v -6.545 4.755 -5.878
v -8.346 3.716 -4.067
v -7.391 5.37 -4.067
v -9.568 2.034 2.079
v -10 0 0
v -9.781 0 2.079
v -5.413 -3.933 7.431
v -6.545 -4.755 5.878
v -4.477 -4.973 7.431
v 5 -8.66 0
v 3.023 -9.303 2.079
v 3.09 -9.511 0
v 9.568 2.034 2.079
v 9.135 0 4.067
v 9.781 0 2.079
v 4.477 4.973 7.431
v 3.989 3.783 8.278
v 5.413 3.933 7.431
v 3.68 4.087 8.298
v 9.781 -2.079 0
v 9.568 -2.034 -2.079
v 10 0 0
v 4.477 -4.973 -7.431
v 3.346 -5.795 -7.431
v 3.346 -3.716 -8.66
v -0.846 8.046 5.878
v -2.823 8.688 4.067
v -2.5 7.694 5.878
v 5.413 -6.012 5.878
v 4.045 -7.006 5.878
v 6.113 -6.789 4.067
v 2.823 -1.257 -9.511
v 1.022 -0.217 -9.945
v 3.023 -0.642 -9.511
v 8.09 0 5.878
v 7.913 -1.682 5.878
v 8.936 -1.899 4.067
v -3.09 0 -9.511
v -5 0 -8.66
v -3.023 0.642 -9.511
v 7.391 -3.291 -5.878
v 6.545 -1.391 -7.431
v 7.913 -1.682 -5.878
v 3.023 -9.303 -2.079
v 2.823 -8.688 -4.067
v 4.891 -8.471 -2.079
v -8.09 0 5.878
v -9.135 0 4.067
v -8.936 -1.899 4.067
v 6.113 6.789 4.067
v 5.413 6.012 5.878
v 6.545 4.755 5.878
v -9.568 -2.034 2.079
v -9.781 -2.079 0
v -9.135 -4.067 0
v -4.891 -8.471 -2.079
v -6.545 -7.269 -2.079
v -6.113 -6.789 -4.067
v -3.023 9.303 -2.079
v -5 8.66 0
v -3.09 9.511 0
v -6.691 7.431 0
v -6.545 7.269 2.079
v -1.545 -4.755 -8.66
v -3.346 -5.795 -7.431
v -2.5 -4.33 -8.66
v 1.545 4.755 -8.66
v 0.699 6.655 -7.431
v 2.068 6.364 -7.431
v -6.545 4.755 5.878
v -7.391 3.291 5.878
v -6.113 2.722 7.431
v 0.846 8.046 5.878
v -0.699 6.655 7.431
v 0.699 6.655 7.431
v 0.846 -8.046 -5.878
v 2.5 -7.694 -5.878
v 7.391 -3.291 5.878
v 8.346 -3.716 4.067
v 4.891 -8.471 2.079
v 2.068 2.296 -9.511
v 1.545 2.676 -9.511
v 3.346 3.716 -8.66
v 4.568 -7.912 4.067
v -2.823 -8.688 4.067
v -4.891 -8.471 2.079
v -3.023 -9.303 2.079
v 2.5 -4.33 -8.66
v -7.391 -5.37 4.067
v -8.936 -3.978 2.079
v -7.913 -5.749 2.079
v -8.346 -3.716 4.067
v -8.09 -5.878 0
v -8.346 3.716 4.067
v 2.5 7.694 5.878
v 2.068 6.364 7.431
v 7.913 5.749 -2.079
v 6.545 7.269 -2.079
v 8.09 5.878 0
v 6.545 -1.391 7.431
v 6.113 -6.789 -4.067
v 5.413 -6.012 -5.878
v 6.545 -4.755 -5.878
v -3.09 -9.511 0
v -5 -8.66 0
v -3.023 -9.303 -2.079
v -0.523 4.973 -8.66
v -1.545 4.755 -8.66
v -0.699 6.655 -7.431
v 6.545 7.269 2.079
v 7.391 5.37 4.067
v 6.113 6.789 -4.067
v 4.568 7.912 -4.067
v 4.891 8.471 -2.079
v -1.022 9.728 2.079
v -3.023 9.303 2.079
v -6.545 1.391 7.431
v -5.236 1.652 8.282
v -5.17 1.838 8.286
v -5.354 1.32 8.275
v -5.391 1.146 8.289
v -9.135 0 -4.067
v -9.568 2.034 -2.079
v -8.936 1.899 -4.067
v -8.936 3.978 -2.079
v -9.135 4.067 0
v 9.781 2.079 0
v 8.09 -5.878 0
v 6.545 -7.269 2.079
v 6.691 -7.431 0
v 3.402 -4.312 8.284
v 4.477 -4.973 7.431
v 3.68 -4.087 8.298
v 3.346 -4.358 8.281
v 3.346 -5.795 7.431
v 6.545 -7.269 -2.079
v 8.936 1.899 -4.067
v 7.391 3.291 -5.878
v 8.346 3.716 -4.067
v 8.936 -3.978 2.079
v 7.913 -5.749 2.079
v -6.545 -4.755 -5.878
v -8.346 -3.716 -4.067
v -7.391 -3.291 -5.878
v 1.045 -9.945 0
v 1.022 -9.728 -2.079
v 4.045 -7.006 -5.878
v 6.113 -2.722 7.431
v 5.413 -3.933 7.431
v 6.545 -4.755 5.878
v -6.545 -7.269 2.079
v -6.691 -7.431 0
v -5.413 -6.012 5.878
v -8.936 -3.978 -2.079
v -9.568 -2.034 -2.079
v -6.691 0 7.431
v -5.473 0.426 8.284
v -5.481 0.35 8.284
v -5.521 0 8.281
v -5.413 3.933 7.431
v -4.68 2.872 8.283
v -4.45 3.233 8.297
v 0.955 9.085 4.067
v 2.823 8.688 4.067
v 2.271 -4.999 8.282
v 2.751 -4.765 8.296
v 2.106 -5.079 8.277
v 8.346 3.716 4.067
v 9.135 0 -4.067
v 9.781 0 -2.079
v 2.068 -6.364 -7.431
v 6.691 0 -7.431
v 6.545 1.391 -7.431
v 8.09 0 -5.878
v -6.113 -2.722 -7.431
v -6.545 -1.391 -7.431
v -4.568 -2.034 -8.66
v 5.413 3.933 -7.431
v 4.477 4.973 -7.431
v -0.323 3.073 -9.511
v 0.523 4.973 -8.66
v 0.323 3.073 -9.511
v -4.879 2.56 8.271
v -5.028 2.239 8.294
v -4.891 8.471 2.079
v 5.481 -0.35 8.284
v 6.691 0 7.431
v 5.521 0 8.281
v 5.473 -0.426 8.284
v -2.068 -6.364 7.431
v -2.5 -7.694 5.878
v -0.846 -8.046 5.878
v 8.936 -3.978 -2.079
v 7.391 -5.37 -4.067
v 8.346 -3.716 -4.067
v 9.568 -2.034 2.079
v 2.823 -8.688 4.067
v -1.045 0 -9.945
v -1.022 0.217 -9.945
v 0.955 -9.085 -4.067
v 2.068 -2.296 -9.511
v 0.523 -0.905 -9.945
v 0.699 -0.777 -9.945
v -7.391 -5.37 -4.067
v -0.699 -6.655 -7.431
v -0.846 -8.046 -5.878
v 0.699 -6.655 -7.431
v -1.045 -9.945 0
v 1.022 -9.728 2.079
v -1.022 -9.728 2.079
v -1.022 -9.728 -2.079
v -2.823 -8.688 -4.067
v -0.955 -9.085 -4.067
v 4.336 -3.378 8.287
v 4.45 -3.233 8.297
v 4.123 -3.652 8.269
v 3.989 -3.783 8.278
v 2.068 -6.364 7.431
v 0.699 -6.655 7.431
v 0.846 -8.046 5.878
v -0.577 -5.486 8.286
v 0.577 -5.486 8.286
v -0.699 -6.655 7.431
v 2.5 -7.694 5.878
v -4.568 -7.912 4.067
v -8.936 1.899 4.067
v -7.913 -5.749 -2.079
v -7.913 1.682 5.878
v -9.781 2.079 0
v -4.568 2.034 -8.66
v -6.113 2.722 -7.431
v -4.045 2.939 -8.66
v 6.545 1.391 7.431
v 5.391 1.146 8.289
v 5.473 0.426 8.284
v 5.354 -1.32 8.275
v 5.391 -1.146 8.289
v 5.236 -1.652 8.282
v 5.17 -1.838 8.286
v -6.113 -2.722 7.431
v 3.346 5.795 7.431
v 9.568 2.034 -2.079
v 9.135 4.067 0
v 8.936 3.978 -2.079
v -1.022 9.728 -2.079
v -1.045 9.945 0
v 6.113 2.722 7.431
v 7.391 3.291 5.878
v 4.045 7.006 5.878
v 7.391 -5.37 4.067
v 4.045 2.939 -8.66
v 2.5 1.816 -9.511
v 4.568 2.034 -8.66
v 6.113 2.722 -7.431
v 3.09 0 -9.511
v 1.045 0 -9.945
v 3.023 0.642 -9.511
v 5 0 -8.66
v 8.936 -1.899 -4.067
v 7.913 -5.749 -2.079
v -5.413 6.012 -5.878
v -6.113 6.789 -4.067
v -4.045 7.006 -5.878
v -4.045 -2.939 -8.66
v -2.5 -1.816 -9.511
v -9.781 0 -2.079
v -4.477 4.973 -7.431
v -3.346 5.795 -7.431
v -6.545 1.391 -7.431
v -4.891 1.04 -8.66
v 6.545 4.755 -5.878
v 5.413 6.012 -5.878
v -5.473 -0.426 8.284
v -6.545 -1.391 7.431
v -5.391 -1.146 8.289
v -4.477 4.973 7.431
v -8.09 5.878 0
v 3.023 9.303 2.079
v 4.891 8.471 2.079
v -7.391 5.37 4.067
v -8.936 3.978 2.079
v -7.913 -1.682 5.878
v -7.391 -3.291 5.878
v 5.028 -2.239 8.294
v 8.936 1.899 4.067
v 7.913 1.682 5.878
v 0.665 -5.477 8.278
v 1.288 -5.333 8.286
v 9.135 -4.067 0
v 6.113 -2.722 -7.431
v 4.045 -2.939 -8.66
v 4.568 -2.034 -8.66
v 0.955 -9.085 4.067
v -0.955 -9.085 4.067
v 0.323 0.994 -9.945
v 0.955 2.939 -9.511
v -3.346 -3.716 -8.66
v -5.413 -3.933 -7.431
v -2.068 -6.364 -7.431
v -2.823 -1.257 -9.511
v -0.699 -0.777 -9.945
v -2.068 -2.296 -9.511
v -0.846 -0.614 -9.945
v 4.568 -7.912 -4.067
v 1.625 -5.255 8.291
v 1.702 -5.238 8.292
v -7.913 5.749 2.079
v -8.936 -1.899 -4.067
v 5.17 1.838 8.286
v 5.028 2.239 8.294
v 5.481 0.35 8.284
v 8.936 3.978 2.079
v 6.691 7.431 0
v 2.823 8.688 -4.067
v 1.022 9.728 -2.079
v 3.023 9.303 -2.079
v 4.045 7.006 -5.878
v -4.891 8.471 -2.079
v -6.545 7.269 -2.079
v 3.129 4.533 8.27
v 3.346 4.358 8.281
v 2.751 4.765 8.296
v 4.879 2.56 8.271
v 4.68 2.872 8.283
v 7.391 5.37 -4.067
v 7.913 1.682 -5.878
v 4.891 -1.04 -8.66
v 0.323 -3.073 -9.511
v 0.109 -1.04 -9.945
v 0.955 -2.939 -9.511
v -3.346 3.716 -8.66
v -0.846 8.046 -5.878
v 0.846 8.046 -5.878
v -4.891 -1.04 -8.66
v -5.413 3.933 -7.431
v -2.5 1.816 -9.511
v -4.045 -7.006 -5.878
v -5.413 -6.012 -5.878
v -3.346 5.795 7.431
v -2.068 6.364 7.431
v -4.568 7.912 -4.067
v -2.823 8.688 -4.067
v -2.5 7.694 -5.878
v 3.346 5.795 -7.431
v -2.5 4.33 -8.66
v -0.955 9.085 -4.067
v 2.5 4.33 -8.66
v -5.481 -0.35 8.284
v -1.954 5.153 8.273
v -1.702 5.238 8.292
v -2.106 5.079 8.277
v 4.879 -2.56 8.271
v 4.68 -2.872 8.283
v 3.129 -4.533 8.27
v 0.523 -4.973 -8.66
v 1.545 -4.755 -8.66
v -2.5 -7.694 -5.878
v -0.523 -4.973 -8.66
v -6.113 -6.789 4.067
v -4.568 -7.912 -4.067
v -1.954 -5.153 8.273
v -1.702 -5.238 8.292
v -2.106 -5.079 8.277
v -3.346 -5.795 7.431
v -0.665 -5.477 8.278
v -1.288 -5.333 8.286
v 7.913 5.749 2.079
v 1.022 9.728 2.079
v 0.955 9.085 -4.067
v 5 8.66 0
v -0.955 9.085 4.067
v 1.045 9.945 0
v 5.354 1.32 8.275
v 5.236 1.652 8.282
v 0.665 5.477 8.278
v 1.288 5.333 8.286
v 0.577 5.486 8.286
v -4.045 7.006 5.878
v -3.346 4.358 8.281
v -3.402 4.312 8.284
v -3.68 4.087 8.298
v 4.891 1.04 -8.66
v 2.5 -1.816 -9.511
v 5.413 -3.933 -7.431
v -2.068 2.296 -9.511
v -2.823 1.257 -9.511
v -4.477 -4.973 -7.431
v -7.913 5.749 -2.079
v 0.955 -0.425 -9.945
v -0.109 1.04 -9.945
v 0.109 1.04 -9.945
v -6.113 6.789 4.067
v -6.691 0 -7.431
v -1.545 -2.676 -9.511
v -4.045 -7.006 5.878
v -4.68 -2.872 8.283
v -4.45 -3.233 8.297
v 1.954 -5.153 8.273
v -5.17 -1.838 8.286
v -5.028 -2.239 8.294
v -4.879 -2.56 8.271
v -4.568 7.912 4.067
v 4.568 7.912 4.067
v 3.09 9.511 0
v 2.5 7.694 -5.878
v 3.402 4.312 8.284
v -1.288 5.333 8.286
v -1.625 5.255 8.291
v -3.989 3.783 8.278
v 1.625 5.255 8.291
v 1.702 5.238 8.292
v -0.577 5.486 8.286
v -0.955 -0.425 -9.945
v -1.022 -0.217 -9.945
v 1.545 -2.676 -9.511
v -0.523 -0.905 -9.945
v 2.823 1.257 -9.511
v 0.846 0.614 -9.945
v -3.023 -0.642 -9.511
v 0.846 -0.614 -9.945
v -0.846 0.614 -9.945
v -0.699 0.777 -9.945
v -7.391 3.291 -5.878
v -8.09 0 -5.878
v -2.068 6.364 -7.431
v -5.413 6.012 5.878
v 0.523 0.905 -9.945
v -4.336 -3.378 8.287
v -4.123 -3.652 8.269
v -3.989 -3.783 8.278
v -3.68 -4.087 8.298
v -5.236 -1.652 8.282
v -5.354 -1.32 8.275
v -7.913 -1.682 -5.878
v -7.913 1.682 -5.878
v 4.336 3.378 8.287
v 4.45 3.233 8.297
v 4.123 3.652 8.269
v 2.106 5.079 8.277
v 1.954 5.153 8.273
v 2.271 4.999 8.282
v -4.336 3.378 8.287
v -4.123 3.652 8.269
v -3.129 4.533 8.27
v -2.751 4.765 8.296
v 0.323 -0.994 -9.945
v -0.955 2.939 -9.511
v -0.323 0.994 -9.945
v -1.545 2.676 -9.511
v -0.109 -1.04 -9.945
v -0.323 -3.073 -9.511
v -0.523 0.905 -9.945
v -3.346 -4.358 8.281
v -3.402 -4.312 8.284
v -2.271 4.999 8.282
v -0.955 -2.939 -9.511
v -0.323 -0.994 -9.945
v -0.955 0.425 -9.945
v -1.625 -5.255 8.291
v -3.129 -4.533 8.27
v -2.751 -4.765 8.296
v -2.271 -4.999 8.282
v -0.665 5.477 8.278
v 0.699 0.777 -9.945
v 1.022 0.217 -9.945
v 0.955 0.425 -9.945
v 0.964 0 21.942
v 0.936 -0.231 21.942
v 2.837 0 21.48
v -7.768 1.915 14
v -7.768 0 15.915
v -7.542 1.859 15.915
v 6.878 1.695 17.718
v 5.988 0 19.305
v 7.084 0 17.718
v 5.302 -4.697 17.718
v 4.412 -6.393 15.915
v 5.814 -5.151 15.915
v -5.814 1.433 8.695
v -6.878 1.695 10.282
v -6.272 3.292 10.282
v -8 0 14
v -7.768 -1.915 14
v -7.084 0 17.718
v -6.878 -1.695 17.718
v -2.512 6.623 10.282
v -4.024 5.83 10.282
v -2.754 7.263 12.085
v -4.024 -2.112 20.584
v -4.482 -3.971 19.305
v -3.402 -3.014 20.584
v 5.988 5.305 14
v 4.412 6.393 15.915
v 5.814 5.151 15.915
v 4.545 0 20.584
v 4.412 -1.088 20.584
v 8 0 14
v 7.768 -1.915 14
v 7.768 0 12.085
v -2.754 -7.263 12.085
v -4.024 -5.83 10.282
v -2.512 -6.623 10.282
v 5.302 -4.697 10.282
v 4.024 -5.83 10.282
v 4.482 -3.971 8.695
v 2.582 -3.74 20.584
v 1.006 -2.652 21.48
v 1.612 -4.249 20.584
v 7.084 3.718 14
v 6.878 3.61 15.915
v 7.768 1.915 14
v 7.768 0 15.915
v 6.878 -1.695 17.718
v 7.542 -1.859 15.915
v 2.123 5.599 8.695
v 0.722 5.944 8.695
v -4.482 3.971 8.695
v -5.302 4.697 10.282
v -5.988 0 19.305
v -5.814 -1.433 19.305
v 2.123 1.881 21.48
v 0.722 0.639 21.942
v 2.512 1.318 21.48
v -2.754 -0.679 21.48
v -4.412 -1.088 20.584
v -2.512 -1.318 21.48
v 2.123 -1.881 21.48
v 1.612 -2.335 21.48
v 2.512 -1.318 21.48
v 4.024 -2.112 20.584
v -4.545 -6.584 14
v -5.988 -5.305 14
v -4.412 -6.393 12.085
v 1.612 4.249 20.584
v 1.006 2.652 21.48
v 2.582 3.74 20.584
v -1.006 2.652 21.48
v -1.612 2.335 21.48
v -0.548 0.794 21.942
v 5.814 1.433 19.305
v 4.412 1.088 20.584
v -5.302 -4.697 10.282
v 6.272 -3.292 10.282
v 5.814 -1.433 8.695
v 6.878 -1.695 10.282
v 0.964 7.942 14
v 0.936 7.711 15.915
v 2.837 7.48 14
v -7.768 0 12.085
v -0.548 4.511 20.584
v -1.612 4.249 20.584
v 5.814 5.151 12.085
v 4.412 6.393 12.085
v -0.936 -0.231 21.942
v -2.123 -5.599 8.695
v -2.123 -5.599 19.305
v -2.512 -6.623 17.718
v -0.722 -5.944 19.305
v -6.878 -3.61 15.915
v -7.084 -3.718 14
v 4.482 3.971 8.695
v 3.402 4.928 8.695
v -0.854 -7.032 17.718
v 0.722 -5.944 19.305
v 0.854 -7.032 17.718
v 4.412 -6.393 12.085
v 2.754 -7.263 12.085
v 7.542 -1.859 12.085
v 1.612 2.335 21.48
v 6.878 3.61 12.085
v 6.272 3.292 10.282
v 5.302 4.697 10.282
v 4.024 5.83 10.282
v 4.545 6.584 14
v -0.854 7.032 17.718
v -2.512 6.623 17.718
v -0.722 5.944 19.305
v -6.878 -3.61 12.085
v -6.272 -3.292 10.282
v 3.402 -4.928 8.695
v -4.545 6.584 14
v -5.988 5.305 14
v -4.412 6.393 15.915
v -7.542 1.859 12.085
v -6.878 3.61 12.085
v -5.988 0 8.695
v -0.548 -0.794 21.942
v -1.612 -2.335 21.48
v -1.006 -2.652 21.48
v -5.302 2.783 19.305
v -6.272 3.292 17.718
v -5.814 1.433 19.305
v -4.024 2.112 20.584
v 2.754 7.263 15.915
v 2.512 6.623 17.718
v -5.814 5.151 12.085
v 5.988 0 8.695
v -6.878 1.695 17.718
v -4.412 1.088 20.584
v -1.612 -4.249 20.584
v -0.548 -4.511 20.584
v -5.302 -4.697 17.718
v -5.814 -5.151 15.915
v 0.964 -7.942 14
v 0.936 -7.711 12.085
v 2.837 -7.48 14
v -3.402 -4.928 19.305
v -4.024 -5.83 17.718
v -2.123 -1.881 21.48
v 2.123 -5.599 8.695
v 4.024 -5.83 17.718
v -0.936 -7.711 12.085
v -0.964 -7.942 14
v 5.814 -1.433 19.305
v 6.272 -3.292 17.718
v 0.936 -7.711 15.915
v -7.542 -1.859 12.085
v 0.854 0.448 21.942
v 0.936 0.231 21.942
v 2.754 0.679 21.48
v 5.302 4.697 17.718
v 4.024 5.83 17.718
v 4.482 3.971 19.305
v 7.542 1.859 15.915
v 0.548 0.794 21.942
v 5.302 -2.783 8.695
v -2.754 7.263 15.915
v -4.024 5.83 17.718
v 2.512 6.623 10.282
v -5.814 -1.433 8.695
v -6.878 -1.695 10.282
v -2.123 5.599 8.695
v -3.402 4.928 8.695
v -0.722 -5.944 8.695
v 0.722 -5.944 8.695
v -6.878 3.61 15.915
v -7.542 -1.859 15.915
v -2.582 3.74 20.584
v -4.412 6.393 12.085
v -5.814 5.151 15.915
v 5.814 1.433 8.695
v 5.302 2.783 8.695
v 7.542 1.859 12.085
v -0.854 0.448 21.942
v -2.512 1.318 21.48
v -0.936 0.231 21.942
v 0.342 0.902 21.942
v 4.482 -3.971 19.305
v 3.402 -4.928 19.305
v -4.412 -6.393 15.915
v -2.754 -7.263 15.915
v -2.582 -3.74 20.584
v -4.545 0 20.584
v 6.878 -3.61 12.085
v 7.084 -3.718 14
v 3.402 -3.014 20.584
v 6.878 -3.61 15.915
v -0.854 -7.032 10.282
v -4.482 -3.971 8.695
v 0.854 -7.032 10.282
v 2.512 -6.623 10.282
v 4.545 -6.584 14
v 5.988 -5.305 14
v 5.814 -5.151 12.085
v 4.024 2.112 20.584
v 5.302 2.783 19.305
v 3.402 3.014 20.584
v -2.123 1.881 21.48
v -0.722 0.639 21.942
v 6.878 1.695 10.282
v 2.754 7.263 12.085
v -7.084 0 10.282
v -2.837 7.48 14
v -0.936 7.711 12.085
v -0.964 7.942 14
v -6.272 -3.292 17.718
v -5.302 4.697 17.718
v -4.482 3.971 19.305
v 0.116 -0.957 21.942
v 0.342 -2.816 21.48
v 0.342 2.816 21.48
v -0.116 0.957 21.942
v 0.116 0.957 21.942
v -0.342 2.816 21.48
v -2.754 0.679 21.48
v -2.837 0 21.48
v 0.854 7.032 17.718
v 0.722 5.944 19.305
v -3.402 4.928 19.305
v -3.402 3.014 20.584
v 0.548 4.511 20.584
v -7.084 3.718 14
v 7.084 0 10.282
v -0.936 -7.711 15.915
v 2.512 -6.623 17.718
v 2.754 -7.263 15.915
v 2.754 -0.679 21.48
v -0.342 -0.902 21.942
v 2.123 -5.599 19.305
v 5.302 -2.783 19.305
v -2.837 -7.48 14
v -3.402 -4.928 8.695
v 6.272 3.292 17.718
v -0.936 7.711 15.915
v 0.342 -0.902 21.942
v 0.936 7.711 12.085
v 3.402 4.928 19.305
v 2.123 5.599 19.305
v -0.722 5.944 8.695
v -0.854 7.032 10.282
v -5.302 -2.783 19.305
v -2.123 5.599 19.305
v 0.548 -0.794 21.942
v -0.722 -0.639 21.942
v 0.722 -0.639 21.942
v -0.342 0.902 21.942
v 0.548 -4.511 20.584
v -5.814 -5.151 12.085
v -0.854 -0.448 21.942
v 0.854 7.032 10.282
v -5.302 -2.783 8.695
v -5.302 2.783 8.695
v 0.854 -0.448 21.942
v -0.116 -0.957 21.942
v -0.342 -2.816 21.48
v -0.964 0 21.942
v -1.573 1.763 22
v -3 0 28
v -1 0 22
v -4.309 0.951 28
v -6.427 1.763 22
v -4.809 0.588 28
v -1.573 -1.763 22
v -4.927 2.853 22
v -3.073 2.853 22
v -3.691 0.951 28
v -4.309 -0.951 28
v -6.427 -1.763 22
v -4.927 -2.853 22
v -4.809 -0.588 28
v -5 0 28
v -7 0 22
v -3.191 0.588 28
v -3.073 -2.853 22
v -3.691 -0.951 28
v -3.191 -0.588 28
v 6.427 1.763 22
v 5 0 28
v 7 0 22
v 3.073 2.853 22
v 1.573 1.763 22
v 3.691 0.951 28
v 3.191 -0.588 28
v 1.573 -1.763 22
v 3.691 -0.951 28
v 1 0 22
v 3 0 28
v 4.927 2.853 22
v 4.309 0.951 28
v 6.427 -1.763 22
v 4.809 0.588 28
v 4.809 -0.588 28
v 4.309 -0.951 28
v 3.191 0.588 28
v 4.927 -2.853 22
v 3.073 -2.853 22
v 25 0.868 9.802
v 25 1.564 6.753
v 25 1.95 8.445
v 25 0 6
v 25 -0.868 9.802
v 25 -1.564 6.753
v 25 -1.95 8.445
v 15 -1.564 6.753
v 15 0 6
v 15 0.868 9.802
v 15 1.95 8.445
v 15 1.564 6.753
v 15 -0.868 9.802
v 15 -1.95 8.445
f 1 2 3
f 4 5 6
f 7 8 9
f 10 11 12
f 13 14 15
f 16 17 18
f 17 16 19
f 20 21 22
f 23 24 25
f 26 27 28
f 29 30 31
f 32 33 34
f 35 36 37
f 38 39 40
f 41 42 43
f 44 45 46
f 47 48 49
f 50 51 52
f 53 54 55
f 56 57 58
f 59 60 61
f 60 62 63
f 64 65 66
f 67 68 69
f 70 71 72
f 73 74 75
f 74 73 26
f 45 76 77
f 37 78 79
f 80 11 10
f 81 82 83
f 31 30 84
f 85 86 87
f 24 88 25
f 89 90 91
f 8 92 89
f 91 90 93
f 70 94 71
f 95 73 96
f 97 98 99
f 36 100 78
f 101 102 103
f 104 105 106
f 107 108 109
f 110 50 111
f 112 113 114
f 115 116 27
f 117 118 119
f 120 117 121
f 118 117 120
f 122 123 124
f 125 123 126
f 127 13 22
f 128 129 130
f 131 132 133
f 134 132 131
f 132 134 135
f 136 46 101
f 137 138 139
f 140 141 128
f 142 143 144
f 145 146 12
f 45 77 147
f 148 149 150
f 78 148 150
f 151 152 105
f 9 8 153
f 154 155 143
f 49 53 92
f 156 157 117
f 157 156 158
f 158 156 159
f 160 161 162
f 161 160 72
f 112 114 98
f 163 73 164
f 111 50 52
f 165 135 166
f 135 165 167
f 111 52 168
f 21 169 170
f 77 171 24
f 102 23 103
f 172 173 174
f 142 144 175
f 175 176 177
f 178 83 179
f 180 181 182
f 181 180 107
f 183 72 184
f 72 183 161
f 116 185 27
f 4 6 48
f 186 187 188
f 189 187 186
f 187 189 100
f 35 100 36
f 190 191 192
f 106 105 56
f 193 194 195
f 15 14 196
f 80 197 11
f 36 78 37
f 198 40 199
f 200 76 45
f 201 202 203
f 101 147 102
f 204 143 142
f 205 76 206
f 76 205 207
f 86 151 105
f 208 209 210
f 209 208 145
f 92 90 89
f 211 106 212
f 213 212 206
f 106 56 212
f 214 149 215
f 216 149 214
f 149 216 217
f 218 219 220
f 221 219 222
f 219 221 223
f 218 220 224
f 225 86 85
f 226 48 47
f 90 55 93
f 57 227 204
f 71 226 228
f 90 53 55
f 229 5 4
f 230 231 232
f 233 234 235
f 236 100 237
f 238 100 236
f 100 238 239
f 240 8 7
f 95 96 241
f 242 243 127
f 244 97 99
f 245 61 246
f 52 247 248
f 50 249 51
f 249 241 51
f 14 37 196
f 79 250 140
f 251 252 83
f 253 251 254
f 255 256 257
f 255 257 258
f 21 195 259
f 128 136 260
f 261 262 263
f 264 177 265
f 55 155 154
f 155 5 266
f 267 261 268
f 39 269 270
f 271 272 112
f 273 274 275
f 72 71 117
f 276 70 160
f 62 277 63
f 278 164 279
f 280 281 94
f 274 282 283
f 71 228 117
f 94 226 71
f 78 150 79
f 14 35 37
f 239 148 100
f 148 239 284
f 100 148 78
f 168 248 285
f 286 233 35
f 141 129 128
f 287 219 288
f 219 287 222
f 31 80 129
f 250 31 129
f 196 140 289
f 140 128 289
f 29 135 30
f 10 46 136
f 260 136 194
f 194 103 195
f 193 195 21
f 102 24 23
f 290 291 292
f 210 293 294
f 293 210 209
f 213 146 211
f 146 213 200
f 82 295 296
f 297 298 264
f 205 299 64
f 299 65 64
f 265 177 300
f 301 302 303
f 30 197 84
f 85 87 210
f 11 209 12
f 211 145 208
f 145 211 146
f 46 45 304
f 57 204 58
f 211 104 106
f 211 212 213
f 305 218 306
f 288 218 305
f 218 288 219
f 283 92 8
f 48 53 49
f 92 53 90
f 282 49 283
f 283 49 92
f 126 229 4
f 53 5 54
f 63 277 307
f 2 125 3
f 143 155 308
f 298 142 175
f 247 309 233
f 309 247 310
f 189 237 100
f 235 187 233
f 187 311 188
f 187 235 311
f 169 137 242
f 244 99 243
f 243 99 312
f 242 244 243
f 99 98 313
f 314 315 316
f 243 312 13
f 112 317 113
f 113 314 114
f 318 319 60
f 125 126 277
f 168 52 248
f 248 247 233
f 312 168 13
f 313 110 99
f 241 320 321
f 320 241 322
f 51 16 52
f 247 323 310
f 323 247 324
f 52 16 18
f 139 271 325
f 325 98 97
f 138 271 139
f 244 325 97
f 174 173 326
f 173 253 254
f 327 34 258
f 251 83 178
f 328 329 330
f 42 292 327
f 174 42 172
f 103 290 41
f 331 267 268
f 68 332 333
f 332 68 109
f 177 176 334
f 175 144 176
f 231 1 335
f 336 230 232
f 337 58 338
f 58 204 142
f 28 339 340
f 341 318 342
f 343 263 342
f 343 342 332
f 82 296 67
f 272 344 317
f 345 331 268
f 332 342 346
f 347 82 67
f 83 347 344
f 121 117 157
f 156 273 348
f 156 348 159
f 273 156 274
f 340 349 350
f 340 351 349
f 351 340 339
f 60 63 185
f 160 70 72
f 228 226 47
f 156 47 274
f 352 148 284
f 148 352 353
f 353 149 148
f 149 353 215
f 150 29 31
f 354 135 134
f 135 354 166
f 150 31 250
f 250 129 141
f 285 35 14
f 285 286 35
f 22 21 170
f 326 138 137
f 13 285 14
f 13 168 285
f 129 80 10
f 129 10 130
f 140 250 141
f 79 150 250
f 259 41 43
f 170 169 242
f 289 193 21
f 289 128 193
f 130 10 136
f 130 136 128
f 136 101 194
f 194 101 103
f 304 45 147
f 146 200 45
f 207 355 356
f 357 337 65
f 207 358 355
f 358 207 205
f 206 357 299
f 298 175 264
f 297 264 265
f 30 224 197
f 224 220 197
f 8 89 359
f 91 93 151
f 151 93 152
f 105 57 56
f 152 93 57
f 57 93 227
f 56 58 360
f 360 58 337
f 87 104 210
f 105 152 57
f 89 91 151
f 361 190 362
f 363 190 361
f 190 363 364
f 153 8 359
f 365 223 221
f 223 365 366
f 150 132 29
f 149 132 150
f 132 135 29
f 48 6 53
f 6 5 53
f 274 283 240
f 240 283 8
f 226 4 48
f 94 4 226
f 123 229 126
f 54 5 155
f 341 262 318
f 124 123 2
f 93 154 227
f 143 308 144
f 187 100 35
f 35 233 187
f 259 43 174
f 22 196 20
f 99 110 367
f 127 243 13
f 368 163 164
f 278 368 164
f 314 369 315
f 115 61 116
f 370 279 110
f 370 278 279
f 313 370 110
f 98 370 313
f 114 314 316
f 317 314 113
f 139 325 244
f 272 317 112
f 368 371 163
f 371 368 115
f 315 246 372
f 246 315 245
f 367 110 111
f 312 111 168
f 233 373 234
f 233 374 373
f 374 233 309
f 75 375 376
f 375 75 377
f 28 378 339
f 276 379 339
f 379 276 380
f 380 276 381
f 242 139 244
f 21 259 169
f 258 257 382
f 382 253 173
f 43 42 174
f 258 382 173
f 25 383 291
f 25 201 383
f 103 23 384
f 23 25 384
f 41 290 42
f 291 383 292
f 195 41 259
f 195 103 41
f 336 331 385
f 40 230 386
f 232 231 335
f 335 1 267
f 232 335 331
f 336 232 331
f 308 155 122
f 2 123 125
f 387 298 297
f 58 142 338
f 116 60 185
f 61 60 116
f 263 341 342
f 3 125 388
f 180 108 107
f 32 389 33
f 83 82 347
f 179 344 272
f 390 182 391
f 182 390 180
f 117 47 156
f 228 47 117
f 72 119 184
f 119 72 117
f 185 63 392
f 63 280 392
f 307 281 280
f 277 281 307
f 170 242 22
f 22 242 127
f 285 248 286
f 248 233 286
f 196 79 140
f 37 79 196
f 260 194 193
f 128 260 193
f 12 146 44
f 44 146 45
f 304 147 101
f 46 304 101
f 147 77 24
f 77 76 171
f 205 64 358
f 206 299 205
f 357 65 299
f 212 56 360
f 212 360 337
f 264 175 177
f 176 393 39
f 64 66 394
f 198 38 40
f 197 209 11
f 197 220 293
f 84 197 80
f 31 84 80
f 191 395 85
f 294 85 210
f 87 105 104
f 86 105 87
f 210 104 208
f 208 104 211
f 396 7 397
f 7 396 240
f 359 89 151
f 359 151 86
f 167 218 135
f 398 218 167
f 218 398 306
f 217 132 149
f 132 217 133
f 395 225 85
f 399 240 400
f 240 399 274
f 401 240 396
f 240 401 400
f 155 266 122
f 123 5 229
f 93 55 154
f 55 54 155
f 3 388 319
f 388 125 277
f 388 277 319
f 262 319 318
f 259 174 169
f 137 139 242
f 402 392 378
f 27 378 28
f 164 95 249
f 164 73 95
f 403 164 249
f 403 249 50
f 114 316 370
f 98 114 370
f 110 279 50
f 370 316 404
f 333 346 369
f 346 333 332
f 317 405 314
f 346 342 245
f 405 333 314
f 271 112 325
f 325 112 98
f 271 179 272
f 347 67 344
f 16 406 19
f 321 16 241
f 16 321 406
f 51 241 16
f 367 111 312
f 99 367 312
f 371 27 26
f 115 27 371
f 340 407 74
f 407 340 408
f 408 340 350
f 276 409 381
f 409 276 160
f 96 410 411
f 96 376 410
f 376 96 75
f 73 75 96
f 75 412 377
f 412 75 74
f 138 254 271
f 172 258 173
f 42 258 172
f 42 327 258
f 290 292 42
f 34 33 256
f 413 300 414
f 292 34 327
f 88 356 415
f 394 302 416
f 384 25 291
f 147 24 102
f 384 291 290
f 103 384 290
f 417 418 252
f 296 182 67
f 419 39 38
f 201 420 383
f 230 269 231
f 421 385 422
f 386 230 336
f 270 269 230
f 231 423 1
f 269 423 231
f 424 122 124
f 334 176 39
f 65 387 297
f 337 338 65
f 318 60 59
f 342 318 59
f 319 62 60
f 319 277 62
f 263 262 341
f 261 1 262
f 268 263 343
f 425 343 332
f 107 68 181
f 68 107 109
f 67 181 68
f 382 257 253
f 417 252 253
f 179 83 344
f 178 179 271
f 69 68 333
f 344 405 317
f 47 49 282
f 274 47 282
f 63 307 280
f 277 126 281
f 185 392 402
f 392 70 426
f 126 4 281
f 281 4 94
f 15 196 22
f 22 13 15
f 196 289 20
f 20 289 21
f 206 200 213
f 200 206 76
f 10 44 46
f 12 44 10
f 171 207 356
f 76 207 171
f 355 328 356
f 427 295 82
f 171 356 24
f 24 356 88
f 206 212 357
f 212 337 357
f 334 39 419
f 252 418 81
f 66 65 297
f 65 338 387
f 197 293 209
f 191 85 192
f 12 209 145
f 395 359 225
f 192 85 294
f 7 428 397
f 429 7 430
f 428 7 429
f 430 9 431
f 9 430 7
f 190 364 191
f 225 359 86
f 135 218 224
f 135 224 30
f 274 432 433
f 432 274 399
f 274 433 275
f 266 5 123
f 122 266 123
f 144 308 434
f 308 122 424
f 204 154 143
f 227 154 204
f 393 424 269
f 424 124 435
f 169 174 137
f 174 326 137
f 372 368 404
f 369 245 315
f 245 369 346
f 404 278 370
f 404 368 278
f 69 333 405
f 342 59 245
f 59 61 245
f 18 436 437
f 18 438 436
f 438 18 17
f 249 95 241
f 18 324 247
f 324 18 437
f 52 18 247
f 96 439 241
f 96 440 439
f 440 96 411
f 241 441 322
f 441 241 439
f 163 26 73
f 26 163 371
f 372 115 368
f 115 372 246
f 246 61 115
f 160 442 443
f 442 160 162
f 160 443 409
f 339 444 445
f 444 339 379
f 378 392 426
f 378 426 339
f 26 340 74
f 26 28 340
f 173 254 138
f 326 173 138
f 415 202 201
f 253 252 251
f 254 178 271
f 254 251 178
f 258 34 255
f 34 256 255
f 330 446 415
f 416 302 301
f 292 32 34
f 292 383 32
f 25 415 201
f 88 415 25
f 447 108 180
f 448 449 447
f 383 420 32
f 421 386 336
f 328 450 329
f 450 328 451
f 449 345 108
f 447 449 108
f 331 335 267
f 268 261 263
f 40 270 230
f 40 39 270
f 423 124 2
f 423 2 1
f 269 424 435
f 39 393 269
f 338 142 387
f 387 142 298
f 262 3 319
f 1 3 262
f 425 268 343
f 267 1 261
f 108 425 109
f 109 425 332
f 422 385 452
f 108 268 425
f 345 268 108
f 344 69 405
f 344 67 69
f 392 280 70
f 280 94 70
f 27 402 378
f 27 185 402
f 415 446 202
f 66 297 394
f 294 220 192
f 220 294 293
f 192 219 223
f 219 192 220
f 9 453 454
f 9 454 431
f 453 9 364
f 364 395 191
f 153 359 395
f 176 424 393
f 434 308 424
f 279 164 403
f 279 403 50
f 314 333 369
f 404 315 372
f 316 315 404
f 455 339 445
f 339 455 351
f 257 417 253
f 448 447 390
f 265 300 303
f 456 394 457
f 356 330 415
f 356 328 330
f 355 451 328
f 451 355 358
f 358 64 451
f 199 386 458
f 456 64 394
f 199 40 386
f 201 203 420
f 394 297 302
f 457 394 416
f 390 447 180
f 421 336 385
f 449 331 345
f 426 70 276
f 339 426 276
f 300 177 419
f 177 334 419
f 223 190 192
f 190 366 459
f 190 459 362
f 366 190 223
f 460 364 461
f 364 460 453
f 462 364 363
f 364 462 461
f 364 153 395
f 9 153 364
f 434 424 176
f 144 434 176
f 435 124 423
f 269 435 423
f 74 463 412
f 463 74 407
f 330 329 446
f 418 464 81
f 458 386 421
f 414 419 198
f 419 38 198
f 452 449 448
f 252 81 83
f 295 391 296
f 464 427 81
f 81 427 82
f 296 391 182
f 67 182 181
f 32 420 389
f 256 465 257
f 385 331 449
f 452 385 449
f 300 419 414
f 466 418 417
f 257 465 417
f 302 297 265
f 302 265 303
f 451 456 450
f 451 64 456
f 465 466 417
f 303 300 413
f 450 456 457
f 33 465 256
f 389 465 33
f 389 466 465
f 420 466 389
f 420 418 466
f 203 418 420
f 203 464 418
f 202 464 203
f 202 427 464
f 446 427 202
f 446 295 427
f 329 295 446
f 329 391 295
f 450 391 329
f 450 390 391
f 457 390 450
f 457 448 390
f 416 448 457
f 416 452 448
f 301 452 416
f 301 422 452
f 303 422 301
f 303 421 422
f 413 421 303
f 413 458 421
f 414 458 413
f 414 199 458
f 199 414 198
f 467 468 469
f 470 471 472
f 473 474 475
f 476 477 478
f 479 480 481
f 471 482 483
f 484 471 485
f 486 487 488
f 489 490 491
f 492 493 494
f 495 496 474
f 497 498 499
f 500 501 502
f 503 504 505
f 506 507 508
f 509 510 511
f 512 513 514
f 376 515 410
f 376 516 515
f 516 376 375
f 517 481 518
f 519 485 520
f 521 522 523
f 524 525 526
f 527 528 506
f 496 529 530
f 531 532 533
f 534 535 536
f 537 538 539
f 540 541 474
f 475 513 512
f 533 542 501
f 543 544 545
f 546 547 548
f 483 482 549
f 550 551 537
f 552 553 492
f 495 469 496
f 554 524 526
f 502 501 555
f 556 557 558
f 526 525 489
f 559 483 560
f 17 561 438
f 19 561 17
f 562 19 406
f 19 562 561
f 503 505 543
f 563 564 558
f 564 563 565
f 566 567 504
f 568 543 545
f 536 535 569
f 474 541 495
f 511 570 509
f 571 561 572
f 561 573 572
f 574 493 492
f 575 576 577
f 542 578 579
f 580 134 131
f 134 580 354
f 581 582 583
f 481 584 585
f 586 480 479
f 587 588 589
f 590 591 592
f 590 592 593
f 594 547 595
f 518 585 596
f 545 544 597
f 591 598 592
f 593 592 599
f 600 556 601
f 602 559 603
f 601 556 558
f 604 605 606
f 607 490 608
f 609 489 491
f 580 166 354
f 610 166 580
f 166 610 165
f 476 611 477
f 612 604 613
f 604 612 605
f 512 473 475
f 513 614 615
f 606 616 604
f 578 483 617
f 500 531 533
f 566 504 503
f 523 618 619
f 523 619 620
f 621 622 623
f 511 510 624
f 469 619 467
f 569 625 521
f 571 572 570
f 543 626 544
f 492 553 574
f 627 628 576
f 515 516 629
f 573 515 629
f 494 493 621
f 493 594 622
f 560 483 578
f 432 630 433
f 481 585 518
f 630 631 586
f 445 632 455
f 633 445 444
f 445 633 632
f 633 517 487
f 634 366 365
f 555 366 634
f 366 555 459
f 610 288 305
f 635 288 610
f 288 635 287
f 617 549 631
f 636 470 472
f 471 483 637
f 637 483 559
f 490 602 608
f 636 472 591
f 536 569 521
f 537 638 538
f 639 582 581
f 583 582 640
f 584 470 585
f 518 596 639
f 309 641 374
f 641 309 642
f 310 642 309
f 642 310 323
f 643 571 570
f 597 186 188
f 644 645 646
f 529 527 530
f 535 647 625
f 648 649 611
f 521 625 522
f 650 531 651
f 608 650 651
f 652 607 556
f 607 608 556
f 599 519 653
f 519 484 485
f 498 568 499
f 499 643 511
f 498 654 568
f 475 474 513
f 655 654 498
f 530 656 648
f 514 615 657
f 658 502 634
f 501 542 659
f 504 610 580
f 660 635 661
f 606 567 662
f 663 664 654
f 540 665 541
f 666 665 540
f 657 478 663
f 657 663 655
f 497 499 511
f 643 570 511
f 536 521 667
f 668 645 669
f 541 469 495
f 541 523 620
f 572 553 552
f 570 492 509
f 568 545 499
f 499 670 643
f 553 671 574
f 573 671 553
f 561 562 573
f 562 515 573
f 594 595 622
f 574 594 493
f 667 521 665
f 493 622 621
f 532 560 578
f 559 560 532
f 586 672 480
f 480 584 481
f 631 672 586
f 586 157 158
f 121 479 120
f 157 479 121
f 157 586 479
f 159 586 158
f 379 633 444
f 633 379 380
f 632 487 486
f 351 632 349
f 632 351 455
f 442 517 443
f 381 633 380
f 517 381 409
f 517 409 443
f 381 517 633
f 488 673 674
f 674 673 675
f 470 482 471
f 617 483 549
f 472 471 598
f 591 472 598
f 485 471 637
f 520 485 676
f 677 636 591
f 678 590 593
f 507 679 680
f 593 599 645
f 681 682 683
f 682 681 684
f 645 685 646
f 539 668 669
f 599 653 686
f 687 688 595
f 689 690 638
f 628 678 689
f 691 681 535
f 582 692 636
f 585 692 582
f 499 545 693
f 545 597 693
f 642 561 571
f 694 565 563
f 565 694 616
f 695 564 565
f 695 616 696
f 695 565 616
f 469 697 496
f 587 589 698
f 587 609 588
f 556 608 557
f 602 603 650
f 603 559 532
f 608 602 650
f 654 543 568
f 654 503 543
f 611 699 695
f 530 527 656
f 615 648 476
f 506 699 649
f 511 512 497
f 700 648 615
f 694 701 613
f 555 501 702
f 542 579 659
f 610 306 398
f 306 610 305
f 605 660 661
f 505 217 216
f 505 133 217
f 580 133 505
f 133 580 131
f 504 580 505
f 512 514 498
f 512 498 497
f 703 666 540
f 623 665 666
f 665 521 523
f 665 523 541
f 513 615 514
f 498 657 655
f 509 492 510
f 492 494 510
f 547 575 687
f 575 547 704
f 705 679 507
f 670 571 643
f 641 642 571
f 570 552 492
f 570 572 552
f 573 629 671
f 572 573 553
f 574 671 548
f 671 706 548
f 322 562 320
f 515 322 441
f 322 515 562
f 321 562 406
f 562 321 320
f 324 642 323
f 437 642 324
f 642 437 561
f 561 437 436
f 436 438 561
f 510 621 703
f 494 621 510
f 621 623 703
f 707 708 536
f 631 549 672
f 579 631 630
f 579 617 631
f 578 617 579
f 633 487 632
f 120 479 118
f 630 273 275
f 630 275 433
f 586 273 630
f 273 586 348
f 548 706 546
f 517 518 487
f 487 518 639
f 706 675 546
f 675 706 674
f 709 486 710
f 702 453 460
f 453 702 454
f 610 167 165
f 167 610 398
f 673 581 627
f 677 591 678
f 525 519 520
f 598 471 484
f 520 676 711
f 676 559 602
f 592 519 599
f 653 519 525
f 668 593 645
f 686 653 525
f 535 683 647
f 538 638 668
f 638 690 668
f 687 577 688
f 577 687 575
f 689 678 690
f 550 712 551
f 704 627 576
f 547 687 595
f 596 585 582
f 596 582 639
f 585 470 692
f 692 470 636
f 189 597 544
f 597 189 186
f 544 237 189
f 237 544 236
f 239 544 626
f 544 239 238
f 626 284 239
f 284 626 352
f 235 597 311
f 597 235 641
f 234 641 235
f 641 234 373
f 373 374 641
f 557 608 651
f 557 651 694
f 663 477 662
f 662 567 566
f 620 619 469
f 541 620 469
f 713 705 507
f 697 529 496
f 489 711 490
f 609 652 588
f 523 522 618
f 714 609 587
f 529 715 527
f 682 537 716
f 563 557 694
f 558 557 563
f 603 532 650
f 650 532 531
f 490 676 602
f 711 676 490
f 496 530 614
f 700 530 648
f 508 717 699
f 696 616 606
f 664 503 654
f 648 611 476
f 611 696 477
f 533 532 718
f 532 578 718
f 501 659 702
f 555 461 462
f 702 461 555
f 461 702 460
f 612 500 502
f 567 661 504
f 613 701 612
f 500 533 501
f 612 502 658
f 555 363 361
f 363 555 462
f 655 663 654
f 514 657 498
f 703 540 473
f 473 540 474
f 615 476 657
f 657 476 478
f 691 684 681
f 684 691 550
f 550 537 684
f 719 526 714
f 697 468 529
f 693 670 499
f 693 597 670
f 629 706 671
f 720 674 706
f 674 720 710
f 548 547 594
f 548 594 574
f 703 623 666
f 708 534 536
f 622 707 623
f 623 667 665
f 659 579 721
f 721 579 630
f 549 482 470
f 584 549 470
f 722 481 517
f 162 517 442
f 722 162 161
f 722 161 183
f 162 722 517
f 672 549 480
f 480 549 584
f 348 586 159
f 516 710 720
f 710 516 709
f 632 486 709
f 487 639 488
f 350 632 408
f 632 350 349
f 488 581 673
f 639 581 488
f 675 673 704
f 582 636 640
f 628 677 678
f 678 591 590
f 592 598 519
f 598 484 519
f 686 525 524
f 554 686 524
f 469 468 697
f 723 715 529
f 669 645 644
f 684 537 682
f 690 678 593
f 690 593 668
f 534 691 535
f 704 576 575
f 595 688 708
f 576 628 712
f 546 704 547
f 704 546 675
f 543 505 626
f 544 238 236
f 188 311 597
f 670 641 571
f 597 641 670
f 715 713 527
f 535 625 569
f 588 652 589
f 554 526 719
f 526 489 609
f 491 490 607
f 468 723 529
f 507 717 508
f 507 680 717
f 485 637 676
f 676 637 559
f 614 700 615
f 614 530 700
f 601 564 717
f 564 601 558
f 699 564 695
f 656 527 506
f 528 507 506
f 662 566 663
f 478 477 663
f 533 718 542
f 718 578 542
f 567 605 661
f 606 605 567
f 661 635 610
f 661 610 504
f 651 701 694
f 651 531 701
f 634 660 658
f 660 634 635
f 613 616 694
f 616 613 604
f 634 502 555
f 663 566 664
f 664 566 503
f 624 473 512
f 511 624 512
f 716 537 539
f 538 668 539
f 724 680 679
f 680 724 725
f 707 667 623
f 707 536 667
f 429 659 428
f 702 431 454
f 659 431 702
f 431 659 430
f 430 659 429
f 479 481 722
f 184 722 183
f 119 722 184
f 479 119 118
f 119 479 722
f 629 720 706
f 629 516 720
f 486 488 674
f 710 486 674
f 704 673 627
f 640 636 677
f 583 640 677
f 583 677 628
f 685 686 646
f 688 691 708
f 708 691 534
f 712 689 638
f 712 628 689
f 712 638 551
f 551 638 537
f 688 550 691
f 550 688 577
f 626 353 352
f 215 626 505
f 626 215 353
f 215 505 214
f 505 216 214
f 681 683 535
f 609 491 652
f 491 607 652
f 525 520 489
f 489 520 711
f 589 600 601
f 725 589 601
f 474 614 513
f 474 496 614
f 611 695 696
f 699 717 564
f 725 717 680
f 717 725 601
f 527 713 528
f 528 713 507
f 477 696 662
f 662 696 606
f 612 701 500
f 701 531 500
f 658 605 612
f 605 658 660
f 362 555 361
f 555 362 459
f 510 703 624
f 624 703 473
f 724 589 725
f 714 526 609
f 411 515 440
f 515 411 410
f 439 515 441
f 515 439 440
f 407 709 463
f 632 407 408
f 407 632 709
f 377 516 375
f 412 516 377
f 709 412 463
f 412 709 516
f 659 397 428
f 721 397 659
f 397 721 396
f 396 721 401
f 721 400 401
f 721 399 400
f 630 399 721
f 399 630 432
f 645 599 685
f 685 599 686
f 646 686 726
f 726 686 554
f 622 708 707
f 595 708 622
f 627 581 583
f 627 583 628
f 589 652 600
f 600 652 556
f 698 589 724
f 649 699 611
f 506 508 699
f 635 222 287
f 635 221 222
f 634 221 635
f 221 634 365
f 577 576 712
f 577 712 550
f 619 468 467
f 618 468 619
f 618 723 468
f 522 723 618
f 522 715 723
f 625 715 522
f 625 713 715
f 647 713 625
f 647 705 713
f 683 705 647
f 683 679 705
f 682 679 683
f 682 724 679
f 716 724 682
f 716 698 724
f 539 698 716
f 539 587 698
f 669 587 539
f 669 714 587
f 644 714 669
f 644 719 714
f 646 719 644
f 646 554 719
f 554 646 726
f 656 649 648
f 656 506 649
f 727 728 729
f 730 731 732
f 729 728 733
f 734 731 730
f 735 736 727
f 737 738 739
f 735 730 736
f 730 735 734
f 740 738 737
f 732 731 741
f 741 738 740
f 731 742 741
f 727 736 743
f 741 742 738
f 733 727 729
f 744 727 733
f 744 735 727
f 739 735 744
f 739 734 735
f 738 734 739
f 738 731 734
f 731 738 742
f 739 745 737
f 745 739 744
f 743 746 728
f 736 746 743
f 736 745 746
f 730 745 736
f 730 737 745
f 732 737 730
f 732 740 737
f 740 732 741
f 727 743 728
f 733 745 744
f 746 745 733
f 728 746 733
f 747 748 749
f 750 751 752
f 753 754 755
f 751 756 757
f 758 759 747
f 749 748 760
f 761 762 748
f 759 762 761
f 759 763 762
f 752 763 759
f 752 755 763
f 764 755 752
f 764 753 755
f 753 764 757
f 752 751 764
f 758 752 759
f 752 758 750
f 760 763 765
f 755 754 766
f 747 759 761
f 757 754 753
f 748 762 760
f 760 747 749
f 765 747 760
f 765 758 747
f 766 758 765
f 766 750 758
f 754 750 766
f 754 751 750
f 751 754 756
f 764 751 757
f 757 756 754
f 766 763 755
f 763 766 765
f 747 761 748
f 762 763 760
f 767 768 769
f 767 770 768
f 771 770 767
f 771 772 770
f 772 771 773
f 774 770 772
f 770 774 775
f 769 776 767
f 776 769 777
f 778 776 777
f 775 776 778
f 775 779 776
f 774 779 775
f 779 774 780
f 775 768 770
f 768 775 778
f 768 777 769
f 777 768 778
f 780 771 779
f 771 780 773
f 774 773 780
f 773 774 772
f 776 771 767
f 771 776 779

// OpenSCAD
union() {
  sphere(r=10);
  translate([0,0,14]) sphere(r=8);
  translate([-4,0,22]) cylinder(h=6, r1=3, r2=1);
  translate([4,0,22]) cylinder(h=6, r1=3, r2=1);
  translate([15,0,8]) rotate([0,90,0]) cylinder(h=10, r=2);
}
